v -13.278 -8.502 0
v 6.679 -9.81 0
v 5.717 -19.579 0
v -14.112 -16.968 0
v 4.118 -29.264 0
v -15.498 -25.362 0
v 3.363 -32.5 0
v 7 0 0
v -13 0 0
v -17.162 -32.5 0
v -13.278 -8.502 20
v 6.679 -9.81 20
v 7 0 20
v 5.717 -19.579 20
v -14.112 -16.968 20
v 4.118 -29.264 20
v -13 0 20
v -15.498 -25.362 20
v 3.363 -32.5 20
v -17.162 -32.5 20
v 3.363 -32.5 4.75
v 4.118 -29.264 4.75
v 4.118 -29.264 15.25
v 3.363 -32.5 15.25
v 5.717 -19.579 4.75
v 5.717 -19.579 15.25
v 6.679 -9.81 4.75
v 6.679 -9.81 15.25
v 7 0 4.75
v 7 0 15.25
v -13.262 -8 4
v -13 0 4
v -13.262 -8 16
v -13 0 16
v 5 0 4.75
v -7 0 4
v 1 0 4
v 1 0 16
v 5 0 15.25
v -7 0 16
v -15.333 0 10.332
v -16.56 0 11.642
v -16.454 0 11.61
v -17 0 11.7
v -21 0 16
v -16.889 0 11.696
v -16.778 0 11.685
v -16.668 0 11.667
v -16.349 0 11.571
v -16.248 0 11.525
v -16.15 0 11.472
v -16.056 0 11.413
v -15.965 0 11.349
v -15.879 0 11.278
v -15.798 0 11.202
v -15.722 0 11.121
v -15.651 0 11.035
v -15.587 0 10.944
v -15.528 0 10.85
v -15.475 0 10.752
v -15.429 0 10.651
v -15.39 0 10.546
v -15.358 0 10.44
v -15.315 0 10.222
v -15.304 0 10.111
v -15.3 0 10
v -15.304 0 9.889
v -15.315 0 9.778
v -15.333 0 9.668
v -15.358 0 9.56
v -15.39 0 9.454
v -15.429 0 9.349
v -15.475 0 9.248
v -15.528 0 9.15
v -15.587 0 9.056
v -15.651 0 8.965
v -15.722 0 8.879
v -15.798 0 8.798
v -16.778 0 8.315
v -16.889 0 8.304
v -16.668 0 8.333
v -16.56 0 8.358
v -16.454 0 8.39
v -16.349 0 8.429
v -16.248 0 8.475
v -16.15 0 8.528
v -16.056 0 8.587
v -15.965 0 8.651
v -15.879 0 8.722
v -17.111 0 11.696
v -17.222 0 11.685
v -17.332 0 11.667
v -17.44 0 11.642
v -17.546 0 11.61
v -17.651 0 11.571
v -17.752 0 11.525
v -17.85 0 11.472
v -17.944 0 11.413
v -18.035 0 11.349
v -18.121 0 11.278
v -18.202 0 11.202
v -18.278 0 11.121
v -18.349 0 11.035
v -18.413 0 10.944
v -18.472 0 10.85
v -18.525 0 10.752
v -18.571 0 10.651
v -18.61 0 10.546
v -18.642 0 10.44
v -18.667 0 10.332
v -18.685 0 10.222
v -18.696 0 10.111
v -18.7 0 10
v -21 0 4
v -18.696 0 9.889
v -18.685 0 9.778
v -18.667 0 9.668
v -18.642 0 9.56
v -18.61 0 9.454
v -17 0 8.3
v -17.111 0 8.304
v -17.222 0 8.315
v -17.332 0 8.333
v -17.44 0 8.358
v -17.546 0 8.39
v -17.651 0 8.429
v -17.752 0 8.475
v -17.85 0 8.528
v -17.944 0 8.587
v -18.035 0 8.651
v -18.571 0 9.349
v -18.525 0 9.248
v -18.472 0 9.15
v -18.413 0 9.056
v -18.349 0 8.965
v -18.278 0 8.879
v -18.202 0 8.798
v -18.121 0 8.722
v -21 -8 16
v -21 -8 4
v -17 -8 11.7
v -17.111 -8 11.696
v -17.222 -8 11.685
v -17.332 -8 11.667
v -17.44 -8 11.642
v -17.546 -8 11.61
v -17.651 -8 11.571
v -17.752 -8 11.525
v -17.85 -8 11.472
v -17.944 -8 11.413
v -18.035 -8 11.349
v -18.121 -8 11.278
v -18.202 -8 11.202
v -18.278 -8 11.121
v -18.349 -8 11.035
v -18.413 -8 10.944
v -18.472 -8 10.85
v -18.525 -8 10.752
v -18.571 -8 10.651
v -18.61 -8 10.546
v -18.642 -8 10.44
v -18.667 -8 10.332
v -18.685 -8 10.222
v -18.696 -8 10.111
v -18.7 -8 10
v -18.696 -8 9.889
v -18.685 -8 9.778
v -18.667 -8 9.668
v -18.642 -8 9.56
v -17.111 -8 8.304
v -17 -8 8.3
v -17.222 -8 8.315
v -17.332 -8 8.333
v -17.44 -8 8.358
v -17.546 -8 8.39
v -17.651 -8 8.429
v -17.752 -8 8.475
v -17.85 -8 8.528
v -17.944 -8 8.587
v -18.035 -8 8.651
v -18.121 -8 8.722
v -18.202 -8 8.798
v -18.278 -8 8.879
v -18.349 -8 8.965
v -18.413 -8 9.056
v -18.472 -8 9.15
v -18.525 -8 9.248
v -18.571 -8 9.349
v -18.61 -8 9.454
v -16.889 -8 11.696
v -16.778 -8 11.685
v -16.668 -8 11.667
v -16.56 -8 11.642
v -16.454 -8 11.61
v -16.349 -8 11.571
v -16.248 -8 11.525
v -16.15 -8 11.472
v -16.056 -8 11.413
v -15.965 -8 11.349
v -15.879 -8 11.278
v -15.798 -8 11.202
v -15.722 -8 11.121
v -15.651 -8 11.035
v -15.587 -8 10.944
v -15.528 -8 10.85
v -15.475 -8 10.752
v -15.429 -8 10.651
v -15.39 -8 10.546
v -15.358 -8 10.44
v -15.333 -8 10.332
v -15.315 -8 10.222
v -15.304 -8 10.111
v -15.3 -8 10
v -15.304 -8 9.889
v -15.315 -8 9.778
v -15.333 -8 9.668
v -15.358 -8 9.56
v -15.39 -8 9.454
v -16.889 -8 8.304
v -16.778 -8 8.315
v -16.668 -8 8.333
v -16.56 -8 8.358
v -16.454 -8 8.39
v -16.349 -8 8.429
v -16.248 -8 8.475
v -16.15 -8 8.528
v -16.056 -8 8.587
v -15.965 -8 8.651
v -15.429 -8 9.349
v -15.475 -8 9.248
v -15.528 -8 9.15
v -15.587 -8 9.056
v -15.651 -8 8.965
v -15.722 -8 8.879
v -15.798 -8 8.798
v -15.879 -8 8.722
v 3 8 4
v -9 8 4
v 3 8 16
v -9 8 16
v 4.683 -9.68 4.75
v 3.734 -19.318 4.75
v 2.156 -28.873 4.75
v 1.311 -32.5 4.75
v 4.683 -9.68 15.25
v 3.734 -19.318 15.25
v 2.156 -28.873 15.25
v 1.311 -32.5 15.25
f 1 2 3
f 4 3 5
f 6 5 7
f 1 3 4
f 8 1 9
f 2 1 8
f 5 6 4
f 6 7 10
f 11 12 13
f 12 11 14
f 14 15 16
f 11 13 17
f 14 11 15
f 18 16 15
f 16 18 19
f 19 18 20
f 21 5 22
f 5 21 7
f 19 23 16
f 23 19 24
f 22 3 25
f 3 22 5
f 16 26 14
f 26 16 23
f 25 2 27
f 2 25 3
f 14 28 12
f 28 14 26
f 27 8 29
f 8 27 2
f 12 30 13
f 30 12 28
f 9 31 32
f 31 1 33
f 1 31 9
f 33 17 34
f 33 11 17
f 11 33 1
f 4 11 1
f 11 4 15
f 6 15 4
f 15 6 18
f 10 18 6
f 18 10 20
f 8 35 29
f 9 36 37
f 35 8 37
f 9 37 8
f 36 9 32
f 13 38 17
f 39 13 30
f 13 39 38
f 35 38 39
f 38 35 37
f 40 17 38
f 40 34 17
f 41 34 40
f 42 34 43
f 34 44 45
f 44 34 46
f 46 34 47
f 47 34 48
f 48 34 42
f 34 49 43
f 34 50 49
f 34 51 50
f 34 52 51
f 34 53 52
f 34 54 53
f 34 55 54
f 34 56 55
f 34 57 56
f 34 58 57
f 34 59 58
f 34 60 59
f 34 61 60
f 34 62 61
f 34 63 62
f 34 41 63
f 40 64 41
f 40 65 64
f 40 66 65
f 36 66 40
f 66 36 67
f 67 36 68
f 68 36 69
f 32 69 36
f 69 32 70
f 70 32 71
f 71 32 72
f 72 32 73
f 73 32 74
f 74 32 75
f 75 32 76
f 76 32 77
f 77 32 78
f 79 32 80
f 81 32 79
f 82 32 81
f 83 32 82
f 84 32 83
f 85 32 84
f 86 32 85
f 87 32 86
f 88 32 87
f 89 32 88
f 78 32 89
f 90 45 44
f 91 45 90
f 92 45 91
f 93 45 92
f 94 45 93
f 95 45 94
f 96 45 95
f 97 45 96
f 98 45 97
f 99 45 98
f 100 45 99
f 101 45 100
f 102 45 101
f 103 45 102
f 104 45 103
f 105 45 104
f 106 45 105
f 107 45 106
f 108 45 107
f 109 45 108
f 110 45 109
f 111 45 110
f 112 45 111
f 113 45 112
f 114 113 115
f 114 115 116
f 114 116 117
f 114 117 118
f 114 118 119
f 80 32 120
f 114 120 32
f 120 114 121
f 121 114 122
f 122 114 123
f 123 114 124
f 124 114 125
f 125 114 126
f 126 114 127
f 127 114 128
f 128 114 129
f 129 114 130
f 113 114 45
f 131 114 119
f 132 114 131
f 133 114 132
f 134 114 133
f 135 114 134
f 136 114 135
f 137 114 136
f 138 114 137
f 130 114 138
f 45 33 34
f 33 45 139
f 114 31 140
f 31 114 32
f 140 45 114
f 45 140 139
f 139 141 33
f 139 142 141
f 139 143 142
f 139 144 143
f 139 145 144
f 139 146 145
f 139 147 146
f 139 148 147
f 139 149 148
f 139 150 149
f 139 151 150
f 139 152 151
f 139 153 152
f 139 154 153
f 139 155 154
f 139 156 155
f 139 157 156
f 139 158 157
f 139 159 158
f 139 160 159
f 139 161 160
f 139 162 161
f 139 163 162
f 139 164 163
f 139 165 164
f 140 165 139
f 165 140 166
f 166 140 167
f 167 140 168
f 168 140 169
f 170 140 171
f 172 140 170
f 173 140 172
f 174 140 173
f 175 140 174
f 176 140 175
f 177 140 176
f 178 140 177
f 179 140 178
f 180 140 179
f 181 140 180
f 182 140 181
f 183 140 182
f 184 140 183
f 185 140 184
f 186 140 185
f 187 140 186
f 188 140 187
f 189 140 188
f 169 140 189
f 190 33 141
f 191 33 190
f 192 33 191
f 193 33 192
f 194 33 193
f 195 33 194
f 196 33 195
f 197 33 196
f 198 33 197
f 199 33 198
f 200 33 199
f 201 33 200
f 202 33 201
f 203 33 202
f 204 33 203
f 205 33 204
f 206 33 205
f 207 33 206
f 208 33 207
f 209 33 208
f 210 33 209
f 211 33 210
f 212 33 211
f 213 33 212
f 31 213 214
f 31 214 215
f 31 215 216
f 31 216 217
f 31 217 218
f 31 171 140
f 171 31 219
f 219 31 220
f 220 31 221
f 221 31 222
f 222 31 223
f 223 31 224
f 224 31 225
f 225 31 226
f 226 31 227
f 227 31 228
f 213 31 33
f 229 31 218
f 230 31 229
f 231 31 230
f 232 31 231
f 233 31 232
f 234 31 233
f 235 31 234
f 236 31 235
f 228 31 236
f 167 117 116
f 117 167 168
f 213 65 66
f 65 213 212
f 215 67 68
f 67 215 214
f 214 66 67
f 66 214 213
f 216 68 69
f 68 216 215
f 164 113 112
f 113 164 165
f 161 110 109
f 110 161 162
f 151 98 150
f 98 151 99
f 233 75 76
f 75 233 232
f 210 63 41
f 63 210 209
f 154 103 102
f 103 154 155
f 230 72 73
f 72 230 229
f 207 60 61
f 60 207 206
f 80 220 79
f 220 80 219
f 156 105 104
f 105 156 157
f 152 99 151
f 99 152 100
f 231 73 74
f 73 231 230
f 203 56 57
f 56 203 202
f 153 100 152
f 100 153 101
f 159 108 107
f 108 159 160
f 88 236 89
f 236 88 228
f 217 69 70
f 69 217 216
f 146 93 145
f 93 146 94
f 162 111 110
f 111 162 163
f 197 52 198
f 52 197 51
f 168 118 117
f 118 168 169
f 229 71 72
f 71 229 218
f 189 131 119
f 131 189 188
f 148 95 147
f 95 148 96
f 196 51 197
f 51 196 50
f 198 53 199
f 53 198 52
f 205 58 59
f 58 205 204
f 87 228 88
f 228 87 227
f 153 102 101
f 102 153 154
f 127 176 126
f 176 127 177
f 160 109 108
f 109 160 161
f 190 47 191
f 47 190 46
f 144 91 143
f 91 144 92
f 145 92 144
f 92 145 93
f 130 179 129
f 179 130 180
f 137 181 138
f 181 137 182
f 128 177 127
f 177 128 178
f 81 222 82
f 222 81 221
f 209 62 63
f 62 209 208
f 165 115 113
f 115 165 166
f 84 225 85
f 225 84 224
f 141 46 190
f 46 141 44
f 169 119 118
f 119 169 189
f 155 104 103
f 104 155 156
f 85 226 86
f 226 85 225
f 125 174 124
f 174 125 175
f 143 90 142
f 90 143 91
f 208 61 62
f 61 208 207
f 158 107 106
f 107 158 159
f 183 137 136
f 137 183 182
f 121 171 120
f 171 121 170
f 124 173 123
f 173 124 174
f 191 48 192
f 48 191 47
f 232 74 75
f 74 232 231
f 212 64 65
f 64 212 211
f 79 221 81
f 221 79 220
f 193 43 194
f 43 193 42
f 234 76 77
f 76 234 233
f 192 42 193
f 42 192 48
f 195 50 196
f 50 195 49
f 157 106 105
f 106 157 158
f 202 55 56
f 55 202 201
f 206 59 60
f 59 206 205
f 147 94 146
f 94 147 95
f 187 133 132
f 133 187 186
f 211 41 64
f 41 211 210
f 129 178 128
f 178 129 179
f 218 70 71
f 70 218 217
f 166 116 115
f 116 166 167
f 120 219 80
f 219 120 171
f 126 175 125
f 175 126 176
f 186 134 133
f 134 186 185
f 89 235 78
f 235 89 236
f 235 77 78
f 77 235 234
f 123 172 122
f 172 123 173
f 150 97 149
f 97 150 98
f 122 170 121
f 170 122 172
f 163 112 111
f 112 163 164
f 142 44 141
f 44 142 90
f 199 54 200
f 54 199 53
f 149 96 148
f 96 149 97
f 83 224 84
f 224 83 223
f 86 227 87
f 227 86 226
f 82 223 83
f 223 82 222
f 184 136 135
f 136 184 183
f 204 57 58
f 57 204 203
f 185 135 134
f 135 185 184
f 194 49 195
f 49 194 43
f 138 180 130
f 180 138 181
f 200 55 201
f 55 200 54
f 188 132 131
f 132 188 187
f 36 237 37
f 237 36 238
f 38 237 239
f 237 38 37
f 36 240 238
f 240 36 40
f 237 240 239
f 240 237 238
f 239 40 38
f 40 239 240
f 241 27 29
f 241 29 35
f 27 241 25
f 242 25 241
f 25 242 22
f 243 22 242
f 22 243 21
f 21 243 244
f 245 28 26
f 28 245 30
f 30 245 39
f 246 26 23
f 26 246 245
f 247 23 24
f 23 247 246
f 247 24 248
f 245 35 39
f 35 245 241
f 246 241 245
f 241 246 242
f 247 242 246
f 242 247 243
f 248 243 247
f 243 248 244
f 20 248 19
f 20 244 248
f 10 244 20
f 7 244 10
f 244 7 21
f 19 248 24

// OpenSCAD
// file: rim_segment.scad
// ferris/rim_segment.scad
// Quarter (90 deg) rim arc with integrated spokes, outer LED groove,
// end dovetails and tangential M3 insert bosses.
// 8 of these make the two discs (4 per disc). All segments are identical;
// segment B = segment A rotated +90 deg, so the tenon on the 90 deg end mates
// with the mortise on the next segment's 0 deg end.

include <../params.scad>;
use <../lib/dovetail.scad>;

dt_h = 12;              // dovetail height (z), centred in the 20 mm band
dt_z = (rim_depth - dt_h) / 2;   // = 4
boss_side = 8;         // tangential + radial size of the joint boss
boss_z = 12;
boss_r_out = rim_inner_r;        // boss hangs inward from the inner rim face
boss_r_in  = rim_inner_r - boss_side;
boss_hole_r = (boss_r_out + boss_r_in) / 2;   // radius at which the bolt runs

module spoke() {
    // radial beam from the mount pad out to the inner rim, plus a bolt pad
    beam_r0 = spoke_mount_r - 2;
    beam_r1 = rim_inner_r + 2;   // overlap into rim for a clean union
    difference() {
        union() {
            translate([(beam_r0 + beam_r1)/2, 0, rim_depth/2])
                cube([beam_r1 - beam_r0, spoke_width, spoke_depth], center = true);
            translate([spoke_mount_r, 0, rim_depth/2])
                cylinder(d = spoke_pad_d, h = spoke_depth, center = true);
        }
        // M3 clearance to bolt onto the hub face
        translate([spoke_mount_r, 0, -1])
            cylinder(d = m3_clear, h = rim_depth + 2);
    }
}

module joint_boss(hole_d) {
    // block hanging inward from the inner rim, with a tangential bolt hole.
    // Modelled at the 0 deg end (face on the x-z plane, y=0), protruding +y.
    difference() {
        translate([boss_r_in, 0, (rim_depth - boss_z)/2])
            cube([boss_side, boss_side, boss_z]);
        // tangential hole along +y at radius boss_hole_r, mid height
        translate([boss_hole_r, -0.1, rim_depth/2])
            rotate([-90, 0, 0])
                cylinder(d = hole_d, h = boss_side + 0.2);
    }
}

module rim_segment() {
    difference() {
        union() {
            // --- annular band, first-quadrant 90 deg wedge ---
            intersection() {
                linear_extrude(rim_depth)
                    difference() { circle(rim_outer_r); circle(rim_inner_r); }
                translate([0, 0, -1])
                    cube([rim_outer_r + 5, rim_outer_r + 5, rim_depth + 2]);
            }
            // --- spokes at 22.5 and 67.5 deg ---
            rotate([0, 0, 22.5]) spoke();
            rotate([0, 0, 67.5]) spoke();
            // --- dovetail tenon on the 90 deg end (protrudes -x, tip wider) ---
            translate([0, rim_outer_r - rim_radial_w/2, dt_z])
                rotate([0, 0, 90])
                    dovetail_tenon(h = dt_h);
            // --- insert boss on 0 deg end, clearance-lug on 90 deg end ---
            joint_boss(m3_insert);                       // 0 deg end (insert)
            mirror([1, -1, 0]) joint_boss(m3_clear);     // 90 deg end (clearance)
        }
        // --- LED groove on the outer periphery ---
        translate([0, 0, (rim_depth - led_groove_w)/2])
            linear_extrude(led_groove_w)
                difference() {
                    circle(rim_outer_r + 5);
                    circle(rim_outer_r - led_groove_d);
                }
        // --- dovetail mortise on the 0 deg end (opens +y) ---
        translate([rim_outer_r - rim_radial_w/2, 0, dt_z])
            dovetail_mortise(h = dt_h);
        // --- gondola axle through-hole (Ø3 rod, E-ring retained outside) ---
        rotate([0, 0, gon_axle_seg_angle])
            translate([gon_axle_r, 0, -1])
                cylinder(d = gon_axle_hole_d, h = rim_depth + 2);
    }
}

rim_segment();
// file: ../lib/dovetail.scad
// lib/dovetail.scad
// Shared joinery modules: dovetail tenon/mortise, M3 insert boss, rounded box.
// Depends on values in params.scad (include it in the calling file).

// A dovetail tenon: a flared prism that grows wider toward its tip so it locks
// against a matching mortise when slid in along +y.
//   len   : protrusion length (along +y)
//   base_w: width at the root (x, near the part)
//   tip_w : width at the tip (x, wider -> self locking)
//   h     : height (z)
// Literal defaults keep this library self-contained under `use <>` (which does
// not import the caller's params). Callers pass explicit sizes where needed.
module dovetail_tenon(len = 8, base_w = 8, tip_w = 12, h = 10) {
    linear_extrude(height = h)
        polygon(points = [
            [-base_w/2, 0],
            [ base_w/2, 0],
            [ tip_w/2,  len],
            [-tip_w/2,  len],
        ]);
}

// Matching mortise volume (subtract this). Enlarged by tol_dovetail per side.
module dovetail_mortise(len = 8, base_w = 8, tip_w = 12, h = 10, clr = 0.15) {
    // extend slightly beyond both faces so the cut is clean
    translate([0, -0.01, -0.01])
        linear_extrude(height = h + 0.02)
            polygon(points = [
                [-(base_w/2 + clr), 0],
                [ (base_w/2 + clr), 0],
                [ (tip_w/2 + clr),  len + 0.02],
                [-(tip_w/2 + clr),  len + 0.02],
            ]);
}

// Cylindrical boss with a blind hole for a heat-set insert.
//   boss_d : outer diameter of the boss
//   boss_h : height
//   hole_d : insert press-hole diameter (params: m3_insert)
//   hole_depth : blind hole depth (0 = through)
module insert_boss(boss_d = 8, boss_h = 8, hole_d = 4.0, hole_depth = 0) {
    difference() {
        cylinder(d = boss_d, h = boss_h);
        translate([0, 0, hole_depth == 0 ? -0.01 : boss_h - hole_depth])
            cylinder(d = hole_d, h = hole_depth == 0 ? boss_h + 0.02 : hole_depth + 0.01);
    }
}

// Rounded rectangular box shell (open top) used by gondola / recesses.
module rounded_box(x, y, z, r = 2) {
    hull() {
        for (sx = [-1, 1], sy = [-1, 1])
            translate([sx * (x/2 - r), sy * (y/2 - r), 0])
                cylinder(r = r, h = z);
    }
}

// A simple rectangular slot cutter (for tabs), centered on x, open along z.
module slot(w, t, d) {
    translate([-w/2, -t/2, -0.01])
        cube([w, t, d + 0.02]);
}
// main file
// joint_test_b.scad
// Coupon B: the 90 deg end of the rim segment (dovetail tenon + clearance lug).
// Centered near the origin, flat on the bed. Mates with joint_test_a.

include <../params.scad>
use <../lib/dovetail.scad>
use <rim_segment.scad>

coupon = 45;   // cube side of the cut region around the joint end

// the 90 deg end sits near x=0, y=rim_outer_r; rotate it down to +x axis
// then bring it back to the origin
translate([-(rim_inner_r - 12) - (rim_radial_w + 30)/2, 0, 0])
    rotate([0, 0, -90])
        intersection() {
            rim_segment();
            translate([-coupon/2 + 10, rim_inner_r - 12, -1])
                cube([coupon, rim_radial_w + 30, rim_depth + 2]);
        }
